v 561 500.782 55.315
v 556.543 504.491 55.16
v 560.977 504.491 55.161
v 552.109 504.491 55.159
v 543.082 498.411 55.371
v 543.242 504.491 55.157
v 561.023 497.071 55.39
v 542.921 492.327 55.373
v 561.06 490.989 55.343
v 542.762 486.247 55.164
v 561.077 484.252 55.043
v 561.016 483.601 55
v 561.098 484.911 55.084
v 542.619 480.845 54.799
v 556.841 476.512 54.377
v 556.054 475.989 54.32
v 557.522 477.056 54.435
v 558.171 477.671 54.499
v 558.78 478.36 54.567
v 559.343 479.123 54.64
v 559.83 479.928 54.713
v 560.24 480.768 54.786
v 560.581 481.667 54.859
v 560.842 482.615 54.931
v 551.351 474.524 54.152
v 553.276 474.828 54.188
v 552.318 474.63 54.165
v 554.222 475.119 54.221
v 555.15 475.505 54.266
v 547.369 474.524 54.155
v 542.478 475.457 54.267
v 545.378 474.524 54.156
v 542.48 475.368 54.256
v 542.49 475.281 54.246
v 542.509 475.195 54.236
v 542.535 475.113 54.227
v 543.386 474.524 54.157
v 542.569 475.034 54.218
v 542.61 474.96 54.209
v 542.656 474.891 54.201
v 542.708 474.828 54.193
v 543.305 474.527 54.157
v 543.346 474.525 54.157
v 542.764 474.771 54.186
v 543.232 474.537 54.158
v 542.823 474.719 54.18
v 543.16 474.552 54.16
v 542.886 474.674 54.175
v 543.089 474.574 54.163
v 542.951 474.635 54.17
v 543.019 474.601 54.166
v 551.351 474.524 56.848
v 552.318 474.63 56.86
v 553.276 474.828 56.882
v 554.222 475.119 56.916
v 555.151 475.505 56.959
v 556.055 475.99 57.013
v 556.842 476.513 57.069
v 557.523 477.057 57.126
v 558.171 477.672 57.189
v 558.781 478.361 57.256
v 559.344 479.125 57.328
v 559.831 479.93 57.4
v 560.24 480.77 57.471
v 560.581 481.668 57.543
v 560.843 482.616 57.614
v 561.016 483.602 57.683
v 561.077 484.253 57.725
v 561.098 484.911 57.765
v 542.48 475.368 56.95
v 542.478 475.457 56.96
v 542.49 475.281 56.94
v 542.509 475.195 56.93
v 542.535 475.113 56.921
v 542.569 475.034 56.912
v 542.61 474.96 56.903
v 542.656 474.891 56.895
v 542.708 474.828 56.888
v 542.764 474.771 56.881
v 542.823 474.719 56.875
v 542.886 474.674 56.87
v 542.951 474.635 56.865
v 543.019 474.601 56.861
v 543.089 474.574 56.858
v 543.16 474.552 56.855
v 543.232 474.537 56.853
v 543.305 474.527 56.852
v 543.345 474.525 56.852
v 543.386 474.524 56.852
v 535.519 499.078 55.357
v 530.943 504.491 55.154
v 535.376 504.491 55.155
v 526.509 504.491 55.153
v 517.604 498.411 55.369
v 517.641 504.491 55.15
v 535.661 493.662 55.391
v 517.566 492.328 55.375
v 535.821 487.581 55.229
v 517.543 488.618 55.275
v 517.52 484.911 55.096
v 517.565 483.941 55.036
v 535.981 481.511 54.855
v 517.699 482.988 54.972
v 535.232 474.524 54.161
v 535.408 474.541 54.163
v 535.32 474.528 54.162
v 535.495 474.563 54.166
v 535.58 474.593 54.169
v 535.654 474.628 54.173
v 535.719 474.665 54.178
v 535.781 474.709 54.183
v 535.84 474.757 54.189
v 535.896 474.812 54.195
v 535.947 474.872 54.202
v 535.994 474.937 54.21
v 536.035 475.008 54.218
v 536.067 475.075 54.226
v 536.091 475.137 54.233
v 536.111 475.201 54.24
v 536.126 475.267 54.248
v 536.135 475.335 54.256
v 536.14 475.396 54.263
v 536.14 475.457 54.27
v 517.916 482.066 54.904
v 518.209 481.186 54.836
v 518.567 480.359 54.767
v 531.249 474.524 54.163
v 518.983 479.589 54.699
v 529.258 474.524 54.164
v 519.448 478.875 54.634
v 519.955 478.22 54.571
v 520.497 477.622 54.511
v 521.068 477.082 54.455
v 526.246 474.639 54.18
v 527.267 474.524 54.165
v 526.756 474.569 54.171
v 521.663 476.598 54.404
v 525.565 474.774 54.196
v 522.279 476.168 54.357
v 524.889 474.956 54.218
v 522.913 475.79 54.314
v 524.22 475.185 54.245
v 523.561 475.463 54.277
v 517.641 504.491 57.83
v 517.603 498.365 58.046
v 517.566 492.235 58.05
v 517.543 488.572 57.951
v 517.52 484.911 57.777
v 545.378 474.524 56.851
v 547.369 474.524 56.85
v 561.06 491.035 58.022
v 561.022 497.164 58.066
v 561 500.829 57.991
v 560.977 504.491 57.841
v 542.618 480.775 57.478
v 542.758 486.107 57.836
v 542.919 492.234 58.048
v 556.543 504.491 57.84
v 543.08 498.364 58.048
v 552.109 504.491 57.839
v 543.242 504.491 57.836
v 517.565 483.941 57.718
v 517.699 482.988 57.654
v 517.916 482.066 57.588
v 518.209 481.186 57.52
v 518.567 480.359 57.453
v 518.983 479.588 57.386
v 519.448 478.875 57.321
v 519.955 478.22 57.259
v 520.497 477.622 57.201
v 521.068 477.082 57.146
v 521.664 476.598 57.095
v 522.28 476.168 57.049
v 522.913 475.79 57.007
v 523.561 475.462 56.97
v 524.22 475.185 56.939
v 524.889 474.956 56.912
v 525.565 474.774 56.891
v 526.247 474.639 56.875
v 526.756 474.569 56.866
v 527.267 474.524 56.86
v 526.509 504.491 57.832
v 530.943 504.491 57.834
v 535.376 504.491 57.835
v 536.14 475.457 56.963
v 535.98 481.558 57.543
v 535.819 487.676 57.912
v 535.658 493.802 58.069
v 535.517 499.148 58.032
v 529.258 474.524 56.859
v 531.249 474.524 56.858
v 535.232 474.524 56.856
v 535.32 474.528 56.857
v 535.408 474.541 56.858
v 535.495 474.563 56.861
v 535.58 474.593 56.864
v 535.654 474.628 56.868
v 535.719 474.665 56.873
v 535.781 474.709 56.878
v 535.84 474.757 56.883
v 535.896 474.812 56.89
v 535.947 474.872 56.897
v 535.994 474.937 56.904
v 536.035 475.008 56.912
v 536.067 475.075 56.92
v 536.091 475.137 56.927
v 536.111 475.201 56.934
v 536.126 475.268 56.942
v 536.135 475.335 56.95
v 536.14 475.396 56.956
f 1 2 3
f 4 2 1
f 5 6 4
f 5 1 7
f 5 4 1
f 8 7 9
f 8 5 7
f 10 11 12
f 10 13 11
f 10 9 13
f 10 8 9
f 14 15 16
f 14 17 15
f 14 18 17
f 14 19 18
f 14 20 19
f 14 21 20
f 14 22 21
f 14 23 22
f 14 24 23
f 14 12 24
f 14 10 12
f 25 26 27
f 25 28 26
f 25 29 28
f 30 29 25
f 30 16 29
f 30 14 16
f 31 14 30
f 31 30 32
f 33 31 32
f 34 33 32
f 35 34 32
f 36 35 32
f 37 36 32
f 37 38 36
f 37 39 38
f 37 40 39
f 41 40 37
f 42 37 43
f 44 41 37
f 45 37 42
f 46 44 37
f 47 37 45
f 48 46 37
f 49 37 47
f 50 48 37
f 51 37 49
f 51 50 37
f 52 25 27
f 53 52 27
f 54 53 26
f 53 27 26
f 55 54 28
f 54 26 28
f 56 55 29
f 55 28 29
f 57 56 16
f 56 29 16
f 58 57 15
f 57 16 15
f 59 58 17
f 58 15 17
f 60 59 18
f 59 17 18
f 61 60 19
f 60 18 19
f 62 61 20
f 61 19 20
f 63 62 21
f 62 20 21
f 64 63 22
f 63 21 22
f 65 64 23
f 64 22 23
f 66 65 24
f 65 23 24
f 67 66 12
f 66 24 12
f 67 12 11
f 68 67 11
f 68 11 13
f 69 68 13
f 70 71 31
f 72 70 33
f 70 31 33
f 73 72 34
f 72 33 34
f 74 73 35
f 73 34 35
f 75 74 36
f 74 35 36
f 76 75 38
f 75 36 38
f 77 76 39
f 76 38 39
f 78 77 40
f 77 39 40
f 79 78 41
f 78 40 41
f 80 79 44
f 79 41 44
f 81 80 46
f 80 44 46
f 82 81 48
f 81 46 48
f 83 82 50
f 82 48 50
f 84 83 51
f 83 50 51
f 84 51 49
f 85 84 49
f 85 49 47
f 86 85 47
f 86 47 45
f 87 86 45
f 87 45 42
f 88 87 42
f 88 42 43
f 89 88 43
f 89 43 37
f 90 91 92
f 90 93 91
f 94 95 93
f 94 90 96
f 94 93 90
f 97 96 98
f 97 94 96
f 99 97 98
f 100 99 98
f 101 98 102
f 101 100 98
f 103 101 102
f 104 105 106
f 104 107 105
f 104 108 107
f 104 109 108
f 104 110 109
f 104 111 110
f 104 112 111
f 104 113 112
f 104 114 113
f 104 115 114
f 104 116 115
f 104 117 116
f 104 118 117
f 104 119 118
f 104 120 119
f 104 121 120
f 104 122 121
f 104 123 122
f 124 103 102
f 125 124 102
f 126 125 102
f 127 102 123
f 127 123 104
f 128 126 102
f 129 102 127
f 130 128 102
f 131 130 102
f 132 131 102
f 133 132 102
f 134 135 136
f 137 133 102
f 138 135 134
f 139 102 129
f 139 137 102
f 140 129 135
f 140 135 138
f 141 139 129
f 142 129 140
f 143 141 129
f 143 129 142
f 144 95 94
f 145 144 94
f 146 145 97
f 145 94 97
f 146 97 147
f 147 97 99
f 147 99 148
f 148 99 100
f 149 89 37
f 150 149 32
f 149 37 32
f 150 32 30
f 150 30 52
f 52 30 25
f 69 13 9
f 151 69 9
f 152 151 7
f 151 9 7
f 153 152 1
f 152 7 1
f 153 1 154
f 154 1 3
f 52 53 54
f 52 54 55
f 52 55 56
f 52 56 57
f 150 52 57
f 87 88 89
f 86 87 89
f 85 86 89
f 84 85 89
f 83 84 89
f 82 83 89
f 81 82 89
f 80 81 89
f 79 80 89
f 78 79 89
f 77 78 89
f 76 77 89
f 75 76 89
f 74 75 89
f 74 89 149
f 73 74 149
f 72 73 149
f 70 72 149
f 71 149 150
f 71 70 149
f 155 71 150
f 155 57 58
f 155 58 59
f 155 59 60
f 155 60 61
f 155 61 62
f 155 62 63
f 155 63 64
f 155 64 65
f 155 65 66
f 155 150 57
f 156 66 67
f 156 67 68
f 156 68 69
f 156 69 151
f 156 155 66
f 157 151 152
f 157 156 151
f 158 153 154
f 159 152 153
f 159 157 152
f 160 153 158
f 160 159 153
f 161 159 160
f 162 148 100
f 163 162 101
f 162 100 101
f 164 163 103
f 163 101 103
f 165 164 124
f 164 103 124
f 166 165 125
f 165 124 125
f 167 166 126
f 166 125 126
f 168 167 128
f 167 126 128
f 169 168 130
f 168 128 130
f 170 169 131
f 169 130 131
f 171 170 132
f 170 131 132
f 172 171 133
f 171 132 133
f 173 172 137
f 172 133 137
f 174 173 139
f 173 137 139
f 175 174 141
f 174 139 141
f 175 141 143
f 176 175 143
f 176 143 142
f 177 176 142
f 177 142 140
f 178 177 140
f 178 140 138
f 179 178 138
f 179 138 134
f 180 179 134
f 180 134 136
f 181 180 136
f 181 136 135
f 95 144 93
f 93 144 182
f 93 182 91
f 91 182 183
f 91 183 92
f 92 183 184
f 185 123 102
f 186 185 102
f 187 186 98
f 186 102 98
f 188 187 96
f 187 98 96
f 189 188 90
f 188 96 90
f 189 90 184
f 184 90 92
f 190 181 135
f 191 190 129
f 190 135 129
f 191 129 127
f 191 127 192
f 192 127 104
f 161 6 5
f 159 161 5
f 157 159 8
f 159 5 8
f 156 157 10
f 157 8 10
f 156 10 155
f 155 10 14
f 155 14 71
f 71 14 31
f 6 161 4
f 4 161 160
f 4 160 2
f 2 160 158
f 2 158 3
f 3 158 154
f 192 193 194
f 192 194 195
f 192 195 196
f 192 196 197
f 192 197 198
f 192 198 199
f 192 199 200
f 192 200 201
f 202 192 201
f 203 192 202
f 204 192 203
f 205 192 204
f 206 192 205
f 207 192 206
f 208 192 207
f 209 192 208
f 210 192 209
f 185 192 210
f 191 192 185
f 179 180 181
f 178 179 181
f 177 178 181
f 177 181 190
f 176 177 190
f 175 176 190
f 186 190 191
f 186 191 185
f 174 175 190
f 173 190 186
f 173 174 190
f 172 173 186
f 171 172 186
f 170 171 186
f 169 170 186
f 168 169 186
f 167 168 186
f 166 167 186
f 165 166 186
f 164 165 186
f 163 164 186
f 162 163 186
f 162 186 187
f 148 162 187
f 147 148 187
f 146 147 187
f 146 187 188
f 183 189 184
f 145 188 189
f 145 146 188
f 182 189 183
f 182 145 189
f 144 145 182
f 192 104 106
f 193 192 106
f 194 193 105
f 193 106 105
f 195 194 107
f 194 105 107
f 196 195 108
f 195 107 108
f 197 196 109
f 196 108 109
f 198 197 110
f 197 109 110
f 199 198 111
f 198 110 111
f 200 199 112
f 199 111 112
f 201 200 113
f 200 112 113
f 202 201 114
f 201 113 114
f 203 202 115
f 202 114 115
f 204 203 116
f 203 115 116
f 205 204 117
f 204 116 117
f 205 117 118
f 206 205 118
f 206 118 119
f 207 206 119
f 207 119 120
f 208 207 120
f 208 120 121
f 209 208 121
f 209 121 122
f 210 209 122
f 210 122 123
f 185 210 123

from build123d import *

# Parameters (mm, degrees)
BOSS_EXTRUDE1_DEPTH     = 111
CUT_EXTRUDE1_DEPTH      = 87
CUT_EXTRUDE1_DEPTH_BACK = 135
SKETCH3_OUTSIDE_W       = 148.268
SKETCH3_OUTSIDE_H       = 164.739
CUT_EXTRUDE2_DEPTH      = 130
KES_EKSTR_ZYON2_DEPTH   = 105


with BuildPart() as part:
    # Sketch1 → Boss-Extrude1 (new body)
    with BuildSketch(Plane.XY):
        with BuildLine():
            Line((517.664410906, 508.286343162), (517.520425715, 484.911395605))
            ThreePointArc((517.520425715, 484.911395605), (520.337490662, 477.788263307), (527.266966018, 474.52372047))
            Line((527.266966018, 474.52372047), (535.231574456, 474.52372047))
            ThreePointArc((535.231574456, 474.52372047), (535.882797488, 474.798496912), (536.140350875, 475.456721632))
            Line((536.140350875, 475.456721632), (534.767316081, 527.642772044))
            ThreePointArc((534.767316081, 527.642772044), (536.009798703, 531.011174662), (539.308986792, 532.427245709))
            ThreePointArc((539.308986792, 532.427245709), (542.608174882, 531.011174662), (543.850657504, 527.642772044))
            Line((543.850657504, 527.642772044), (542.477622709, 475.456721632))
            ThreePointArc((542.477622709, 475.456721632), (542.735176097, 474.798496912), (543.386399129, 474.52372047))
            Line((543.386399129, 474.52372047), (551.351007567, 474.52372047))
            ThreePointArc((551.351007567, 474.52372047), (558.281408258, 477.787395085), (561.097547869, 484.911395605))
            Line((561.097547869, 484.911395605), (560.953562679, 508.286343162))
            Line((560.953562679, 508.286343162), (560.734184481, 556.870055971))
            ThreePointArc((560.734184481, 556.870055971), (560.973621774, 561.417033438), (561.400829106, 565.950225271))
            Line((561.400829106, 565.950225271), (564.727256596, 601.253845235))
            ThreePointArc((564.727256596, 601.253845235), (564.61086534, 601.602450692), (564.274715543, 601.751030651))
            Line((564.274715543, 601.751030651), (543.683269376, 601.766265108))
            Line((543.683269376, 601.766265108), (542.621914123, 601.766265108))
            ThreePointArc((542.621914123, 601.766265108), (542.294228998, 601.626733985), (542.167721876, 601.293803928))
            Line((542.167721876, 601.293803928), (542.302077184, 582.505937358))
            ThreePointArc((542.302077184, 582.505937358), (539.302077184, 579.505937358), (536.302077184, 582.505937358))
            Line((536.302077184, 582.505937358), (536.436432491, 601.278569471))
            ThreePointArc((536.436432491, 601.278569471), (536.309925369, 601.611499528), (535.982240245, 601.751030651))
            Line((535.982240245, 601.751030651), (534.934704209, 601.751030651))
            Line((534.934704209, 601.751030651), (514.343258041, 601.751030651))
            ThreePointArc((514.343258041, 601.751030651), (514.007108245, 601.602450692), (513.890716989, 601.253845235))
            Line((513.890716989, 601.253845235), (517.217144479, 565.950225271))
            ThreePointArc((517.217144479, 565.950225271), (517.644351811, 561.417033438), (517.883789104, 556.870055971))
            Line((517.883789104, 556.870055971), (517.664410906, 508.286343162))
        make_face()
    extrude(amount=BOSS_EXTRUDE1_DEPTH)

    # Sketch3 outside → Cut-Extrude1 (cut, two sides: drawn at the far end of the back side and taken through both)
    with BuildSketch(Plane(origin=(563.237229272, 2.543279656, 0), x_dir=(0, 0, -1), z_dir=(0.9999898054305035, 0.004515421914267879, 0)).offset(-CUT_EXTRUDE1_DEPTH_BACK)):
        with Locations((-55.5, 535.7045)):
            Rectangle(SKETCH3_OUTSIDE_W, SKETCH3_OUTSIDE_H)
        with BuildLine():
            Line((-54.15240337, 472.029300483), (-56.84759663, 472.029300483))
            ThreePointArc((-56.84759663, 472.029300483), (-57.9806744, 487.067749831), (-57.830390264, 502.148076045))
            Line((-57.830390264, 502.148076045), (-56.463425913, 528.137009263))
            ThreePointArc((-56.463425913, 528.137009263), (-56.603102413, 538.142393826), (-58.068514869, 548.04086826))
            ThreePointArc((-58.068514869, 548.04086826), (-61.622708542, 565.163731064), (-64.874259312, 582.346633638))
            ThreePointArc((-64.874259312, 582.346633638), (-66.259909233, 590.781608006), (-67.385509377, 599.2552048))
            Line((-67.385509377, 599.2552048), (-64.690775732, 599.2552048))
            ThreePointArc((-64.690775732, 599.2552048), (-61.048172301, 576.611234839), (-55.533089644, 554.349119068))
            ThreePointArc((-55.533089644, 554.349119068), (-52.510625549, 537.211146411), (-53.299381188, 519.826576801))
            ThreePointArc((-53.299381188, 519.826576801), (-55.370891734, 495.957296403), (-54.15240337, 472.029300483))
        make_face(mode=Mode.SUBTRACT)
    extrude(amount=CUT_EXTRUDE1_DEPTH + CUT_EXTRUDE1_DEPTH_BACK, mode=Mode.SUBTRACT)

    # Sketch4 → Cut-Extrude2 (cut)
    with BuildSketch(Plane.XY):
        with BuildLine():
            Line((525.210033379, 573.07372047), (527.307940206, 573.07372047))
            ThreePointArc((527.307940206, 573.07372047), (528.434711696, 573.14721298), (529.29348257, 572.414050156))
            ThreePointArc((529.29348257, 572.414050156), (526.258986792, 564.47372047), (523.224491015, 572.414050156))
            ThreePointArc((523.224491015, 572.414050156), (524.083261888, 573.14721298), (525.210033379, 573.07372047))
        make_face()
        with BuildLine():
            Line((551.310033379, 573.07372047), (553.407940206, 573.07372047))
            ThreePointArc((553.407940206, 573.07372047), (554.534711696, 573.14721298), (555.39348257, 572.414050156))
            ThreePointArc((555.39348257, 572.414050156), (552.358986792, 564.47372047), (549.324491015, 572.414050156))
            ThreePointArc((549.324491015, 572.414050156), (550.183261888, 573.14721298), (551.310033379, 573.07372047))
        make_face()
    extrude(amount=CUT_EXTRUDE2_DEPTH, mode=Mode.SUBTRACT)

    # Çizim1 → Kes-Ekstrüzyon2 (cut, symmetric)
    with BuildSketch(Plane.XY):
        Polygon((517.641029775, 635.317918458), (477.326818539, 635.317918458), (477.326818539, 504.490586759), (517.641029775, 504.490586759), (580.201786594, 504.490586759), (580.201786594, 635.317918458), align=None)
    extrude(amount=KES_EKSTR_ZYON2_DEPTH, both=True, mode=Mode.SUBTRACT)


with BuildPart() as kes_ekstr_zyon2_piece_1:
    # of the separate pieces the step leaves, piece 1, a body of its own (kes_ekstr_zyon2_pieces)
    add(part.part.solids().sort_by_distance((543.241514721, 504.490586759, 55.156538323))[0])


with BuildPart() as kes_ekstr_zyon2_piece_2:
    # of the separate pieces the step leaves, piece 2, a body of its own (kes_ekstr_zyon2_pieces)
    add(part.part.solids().sort_by_distance((517.641029775, 504.490586759, 55.150403082))[0])


solid = Compound([kes_ekstr_zyon2_piece_1.part, kes_ekstr_zyon2_piece_2.part])
